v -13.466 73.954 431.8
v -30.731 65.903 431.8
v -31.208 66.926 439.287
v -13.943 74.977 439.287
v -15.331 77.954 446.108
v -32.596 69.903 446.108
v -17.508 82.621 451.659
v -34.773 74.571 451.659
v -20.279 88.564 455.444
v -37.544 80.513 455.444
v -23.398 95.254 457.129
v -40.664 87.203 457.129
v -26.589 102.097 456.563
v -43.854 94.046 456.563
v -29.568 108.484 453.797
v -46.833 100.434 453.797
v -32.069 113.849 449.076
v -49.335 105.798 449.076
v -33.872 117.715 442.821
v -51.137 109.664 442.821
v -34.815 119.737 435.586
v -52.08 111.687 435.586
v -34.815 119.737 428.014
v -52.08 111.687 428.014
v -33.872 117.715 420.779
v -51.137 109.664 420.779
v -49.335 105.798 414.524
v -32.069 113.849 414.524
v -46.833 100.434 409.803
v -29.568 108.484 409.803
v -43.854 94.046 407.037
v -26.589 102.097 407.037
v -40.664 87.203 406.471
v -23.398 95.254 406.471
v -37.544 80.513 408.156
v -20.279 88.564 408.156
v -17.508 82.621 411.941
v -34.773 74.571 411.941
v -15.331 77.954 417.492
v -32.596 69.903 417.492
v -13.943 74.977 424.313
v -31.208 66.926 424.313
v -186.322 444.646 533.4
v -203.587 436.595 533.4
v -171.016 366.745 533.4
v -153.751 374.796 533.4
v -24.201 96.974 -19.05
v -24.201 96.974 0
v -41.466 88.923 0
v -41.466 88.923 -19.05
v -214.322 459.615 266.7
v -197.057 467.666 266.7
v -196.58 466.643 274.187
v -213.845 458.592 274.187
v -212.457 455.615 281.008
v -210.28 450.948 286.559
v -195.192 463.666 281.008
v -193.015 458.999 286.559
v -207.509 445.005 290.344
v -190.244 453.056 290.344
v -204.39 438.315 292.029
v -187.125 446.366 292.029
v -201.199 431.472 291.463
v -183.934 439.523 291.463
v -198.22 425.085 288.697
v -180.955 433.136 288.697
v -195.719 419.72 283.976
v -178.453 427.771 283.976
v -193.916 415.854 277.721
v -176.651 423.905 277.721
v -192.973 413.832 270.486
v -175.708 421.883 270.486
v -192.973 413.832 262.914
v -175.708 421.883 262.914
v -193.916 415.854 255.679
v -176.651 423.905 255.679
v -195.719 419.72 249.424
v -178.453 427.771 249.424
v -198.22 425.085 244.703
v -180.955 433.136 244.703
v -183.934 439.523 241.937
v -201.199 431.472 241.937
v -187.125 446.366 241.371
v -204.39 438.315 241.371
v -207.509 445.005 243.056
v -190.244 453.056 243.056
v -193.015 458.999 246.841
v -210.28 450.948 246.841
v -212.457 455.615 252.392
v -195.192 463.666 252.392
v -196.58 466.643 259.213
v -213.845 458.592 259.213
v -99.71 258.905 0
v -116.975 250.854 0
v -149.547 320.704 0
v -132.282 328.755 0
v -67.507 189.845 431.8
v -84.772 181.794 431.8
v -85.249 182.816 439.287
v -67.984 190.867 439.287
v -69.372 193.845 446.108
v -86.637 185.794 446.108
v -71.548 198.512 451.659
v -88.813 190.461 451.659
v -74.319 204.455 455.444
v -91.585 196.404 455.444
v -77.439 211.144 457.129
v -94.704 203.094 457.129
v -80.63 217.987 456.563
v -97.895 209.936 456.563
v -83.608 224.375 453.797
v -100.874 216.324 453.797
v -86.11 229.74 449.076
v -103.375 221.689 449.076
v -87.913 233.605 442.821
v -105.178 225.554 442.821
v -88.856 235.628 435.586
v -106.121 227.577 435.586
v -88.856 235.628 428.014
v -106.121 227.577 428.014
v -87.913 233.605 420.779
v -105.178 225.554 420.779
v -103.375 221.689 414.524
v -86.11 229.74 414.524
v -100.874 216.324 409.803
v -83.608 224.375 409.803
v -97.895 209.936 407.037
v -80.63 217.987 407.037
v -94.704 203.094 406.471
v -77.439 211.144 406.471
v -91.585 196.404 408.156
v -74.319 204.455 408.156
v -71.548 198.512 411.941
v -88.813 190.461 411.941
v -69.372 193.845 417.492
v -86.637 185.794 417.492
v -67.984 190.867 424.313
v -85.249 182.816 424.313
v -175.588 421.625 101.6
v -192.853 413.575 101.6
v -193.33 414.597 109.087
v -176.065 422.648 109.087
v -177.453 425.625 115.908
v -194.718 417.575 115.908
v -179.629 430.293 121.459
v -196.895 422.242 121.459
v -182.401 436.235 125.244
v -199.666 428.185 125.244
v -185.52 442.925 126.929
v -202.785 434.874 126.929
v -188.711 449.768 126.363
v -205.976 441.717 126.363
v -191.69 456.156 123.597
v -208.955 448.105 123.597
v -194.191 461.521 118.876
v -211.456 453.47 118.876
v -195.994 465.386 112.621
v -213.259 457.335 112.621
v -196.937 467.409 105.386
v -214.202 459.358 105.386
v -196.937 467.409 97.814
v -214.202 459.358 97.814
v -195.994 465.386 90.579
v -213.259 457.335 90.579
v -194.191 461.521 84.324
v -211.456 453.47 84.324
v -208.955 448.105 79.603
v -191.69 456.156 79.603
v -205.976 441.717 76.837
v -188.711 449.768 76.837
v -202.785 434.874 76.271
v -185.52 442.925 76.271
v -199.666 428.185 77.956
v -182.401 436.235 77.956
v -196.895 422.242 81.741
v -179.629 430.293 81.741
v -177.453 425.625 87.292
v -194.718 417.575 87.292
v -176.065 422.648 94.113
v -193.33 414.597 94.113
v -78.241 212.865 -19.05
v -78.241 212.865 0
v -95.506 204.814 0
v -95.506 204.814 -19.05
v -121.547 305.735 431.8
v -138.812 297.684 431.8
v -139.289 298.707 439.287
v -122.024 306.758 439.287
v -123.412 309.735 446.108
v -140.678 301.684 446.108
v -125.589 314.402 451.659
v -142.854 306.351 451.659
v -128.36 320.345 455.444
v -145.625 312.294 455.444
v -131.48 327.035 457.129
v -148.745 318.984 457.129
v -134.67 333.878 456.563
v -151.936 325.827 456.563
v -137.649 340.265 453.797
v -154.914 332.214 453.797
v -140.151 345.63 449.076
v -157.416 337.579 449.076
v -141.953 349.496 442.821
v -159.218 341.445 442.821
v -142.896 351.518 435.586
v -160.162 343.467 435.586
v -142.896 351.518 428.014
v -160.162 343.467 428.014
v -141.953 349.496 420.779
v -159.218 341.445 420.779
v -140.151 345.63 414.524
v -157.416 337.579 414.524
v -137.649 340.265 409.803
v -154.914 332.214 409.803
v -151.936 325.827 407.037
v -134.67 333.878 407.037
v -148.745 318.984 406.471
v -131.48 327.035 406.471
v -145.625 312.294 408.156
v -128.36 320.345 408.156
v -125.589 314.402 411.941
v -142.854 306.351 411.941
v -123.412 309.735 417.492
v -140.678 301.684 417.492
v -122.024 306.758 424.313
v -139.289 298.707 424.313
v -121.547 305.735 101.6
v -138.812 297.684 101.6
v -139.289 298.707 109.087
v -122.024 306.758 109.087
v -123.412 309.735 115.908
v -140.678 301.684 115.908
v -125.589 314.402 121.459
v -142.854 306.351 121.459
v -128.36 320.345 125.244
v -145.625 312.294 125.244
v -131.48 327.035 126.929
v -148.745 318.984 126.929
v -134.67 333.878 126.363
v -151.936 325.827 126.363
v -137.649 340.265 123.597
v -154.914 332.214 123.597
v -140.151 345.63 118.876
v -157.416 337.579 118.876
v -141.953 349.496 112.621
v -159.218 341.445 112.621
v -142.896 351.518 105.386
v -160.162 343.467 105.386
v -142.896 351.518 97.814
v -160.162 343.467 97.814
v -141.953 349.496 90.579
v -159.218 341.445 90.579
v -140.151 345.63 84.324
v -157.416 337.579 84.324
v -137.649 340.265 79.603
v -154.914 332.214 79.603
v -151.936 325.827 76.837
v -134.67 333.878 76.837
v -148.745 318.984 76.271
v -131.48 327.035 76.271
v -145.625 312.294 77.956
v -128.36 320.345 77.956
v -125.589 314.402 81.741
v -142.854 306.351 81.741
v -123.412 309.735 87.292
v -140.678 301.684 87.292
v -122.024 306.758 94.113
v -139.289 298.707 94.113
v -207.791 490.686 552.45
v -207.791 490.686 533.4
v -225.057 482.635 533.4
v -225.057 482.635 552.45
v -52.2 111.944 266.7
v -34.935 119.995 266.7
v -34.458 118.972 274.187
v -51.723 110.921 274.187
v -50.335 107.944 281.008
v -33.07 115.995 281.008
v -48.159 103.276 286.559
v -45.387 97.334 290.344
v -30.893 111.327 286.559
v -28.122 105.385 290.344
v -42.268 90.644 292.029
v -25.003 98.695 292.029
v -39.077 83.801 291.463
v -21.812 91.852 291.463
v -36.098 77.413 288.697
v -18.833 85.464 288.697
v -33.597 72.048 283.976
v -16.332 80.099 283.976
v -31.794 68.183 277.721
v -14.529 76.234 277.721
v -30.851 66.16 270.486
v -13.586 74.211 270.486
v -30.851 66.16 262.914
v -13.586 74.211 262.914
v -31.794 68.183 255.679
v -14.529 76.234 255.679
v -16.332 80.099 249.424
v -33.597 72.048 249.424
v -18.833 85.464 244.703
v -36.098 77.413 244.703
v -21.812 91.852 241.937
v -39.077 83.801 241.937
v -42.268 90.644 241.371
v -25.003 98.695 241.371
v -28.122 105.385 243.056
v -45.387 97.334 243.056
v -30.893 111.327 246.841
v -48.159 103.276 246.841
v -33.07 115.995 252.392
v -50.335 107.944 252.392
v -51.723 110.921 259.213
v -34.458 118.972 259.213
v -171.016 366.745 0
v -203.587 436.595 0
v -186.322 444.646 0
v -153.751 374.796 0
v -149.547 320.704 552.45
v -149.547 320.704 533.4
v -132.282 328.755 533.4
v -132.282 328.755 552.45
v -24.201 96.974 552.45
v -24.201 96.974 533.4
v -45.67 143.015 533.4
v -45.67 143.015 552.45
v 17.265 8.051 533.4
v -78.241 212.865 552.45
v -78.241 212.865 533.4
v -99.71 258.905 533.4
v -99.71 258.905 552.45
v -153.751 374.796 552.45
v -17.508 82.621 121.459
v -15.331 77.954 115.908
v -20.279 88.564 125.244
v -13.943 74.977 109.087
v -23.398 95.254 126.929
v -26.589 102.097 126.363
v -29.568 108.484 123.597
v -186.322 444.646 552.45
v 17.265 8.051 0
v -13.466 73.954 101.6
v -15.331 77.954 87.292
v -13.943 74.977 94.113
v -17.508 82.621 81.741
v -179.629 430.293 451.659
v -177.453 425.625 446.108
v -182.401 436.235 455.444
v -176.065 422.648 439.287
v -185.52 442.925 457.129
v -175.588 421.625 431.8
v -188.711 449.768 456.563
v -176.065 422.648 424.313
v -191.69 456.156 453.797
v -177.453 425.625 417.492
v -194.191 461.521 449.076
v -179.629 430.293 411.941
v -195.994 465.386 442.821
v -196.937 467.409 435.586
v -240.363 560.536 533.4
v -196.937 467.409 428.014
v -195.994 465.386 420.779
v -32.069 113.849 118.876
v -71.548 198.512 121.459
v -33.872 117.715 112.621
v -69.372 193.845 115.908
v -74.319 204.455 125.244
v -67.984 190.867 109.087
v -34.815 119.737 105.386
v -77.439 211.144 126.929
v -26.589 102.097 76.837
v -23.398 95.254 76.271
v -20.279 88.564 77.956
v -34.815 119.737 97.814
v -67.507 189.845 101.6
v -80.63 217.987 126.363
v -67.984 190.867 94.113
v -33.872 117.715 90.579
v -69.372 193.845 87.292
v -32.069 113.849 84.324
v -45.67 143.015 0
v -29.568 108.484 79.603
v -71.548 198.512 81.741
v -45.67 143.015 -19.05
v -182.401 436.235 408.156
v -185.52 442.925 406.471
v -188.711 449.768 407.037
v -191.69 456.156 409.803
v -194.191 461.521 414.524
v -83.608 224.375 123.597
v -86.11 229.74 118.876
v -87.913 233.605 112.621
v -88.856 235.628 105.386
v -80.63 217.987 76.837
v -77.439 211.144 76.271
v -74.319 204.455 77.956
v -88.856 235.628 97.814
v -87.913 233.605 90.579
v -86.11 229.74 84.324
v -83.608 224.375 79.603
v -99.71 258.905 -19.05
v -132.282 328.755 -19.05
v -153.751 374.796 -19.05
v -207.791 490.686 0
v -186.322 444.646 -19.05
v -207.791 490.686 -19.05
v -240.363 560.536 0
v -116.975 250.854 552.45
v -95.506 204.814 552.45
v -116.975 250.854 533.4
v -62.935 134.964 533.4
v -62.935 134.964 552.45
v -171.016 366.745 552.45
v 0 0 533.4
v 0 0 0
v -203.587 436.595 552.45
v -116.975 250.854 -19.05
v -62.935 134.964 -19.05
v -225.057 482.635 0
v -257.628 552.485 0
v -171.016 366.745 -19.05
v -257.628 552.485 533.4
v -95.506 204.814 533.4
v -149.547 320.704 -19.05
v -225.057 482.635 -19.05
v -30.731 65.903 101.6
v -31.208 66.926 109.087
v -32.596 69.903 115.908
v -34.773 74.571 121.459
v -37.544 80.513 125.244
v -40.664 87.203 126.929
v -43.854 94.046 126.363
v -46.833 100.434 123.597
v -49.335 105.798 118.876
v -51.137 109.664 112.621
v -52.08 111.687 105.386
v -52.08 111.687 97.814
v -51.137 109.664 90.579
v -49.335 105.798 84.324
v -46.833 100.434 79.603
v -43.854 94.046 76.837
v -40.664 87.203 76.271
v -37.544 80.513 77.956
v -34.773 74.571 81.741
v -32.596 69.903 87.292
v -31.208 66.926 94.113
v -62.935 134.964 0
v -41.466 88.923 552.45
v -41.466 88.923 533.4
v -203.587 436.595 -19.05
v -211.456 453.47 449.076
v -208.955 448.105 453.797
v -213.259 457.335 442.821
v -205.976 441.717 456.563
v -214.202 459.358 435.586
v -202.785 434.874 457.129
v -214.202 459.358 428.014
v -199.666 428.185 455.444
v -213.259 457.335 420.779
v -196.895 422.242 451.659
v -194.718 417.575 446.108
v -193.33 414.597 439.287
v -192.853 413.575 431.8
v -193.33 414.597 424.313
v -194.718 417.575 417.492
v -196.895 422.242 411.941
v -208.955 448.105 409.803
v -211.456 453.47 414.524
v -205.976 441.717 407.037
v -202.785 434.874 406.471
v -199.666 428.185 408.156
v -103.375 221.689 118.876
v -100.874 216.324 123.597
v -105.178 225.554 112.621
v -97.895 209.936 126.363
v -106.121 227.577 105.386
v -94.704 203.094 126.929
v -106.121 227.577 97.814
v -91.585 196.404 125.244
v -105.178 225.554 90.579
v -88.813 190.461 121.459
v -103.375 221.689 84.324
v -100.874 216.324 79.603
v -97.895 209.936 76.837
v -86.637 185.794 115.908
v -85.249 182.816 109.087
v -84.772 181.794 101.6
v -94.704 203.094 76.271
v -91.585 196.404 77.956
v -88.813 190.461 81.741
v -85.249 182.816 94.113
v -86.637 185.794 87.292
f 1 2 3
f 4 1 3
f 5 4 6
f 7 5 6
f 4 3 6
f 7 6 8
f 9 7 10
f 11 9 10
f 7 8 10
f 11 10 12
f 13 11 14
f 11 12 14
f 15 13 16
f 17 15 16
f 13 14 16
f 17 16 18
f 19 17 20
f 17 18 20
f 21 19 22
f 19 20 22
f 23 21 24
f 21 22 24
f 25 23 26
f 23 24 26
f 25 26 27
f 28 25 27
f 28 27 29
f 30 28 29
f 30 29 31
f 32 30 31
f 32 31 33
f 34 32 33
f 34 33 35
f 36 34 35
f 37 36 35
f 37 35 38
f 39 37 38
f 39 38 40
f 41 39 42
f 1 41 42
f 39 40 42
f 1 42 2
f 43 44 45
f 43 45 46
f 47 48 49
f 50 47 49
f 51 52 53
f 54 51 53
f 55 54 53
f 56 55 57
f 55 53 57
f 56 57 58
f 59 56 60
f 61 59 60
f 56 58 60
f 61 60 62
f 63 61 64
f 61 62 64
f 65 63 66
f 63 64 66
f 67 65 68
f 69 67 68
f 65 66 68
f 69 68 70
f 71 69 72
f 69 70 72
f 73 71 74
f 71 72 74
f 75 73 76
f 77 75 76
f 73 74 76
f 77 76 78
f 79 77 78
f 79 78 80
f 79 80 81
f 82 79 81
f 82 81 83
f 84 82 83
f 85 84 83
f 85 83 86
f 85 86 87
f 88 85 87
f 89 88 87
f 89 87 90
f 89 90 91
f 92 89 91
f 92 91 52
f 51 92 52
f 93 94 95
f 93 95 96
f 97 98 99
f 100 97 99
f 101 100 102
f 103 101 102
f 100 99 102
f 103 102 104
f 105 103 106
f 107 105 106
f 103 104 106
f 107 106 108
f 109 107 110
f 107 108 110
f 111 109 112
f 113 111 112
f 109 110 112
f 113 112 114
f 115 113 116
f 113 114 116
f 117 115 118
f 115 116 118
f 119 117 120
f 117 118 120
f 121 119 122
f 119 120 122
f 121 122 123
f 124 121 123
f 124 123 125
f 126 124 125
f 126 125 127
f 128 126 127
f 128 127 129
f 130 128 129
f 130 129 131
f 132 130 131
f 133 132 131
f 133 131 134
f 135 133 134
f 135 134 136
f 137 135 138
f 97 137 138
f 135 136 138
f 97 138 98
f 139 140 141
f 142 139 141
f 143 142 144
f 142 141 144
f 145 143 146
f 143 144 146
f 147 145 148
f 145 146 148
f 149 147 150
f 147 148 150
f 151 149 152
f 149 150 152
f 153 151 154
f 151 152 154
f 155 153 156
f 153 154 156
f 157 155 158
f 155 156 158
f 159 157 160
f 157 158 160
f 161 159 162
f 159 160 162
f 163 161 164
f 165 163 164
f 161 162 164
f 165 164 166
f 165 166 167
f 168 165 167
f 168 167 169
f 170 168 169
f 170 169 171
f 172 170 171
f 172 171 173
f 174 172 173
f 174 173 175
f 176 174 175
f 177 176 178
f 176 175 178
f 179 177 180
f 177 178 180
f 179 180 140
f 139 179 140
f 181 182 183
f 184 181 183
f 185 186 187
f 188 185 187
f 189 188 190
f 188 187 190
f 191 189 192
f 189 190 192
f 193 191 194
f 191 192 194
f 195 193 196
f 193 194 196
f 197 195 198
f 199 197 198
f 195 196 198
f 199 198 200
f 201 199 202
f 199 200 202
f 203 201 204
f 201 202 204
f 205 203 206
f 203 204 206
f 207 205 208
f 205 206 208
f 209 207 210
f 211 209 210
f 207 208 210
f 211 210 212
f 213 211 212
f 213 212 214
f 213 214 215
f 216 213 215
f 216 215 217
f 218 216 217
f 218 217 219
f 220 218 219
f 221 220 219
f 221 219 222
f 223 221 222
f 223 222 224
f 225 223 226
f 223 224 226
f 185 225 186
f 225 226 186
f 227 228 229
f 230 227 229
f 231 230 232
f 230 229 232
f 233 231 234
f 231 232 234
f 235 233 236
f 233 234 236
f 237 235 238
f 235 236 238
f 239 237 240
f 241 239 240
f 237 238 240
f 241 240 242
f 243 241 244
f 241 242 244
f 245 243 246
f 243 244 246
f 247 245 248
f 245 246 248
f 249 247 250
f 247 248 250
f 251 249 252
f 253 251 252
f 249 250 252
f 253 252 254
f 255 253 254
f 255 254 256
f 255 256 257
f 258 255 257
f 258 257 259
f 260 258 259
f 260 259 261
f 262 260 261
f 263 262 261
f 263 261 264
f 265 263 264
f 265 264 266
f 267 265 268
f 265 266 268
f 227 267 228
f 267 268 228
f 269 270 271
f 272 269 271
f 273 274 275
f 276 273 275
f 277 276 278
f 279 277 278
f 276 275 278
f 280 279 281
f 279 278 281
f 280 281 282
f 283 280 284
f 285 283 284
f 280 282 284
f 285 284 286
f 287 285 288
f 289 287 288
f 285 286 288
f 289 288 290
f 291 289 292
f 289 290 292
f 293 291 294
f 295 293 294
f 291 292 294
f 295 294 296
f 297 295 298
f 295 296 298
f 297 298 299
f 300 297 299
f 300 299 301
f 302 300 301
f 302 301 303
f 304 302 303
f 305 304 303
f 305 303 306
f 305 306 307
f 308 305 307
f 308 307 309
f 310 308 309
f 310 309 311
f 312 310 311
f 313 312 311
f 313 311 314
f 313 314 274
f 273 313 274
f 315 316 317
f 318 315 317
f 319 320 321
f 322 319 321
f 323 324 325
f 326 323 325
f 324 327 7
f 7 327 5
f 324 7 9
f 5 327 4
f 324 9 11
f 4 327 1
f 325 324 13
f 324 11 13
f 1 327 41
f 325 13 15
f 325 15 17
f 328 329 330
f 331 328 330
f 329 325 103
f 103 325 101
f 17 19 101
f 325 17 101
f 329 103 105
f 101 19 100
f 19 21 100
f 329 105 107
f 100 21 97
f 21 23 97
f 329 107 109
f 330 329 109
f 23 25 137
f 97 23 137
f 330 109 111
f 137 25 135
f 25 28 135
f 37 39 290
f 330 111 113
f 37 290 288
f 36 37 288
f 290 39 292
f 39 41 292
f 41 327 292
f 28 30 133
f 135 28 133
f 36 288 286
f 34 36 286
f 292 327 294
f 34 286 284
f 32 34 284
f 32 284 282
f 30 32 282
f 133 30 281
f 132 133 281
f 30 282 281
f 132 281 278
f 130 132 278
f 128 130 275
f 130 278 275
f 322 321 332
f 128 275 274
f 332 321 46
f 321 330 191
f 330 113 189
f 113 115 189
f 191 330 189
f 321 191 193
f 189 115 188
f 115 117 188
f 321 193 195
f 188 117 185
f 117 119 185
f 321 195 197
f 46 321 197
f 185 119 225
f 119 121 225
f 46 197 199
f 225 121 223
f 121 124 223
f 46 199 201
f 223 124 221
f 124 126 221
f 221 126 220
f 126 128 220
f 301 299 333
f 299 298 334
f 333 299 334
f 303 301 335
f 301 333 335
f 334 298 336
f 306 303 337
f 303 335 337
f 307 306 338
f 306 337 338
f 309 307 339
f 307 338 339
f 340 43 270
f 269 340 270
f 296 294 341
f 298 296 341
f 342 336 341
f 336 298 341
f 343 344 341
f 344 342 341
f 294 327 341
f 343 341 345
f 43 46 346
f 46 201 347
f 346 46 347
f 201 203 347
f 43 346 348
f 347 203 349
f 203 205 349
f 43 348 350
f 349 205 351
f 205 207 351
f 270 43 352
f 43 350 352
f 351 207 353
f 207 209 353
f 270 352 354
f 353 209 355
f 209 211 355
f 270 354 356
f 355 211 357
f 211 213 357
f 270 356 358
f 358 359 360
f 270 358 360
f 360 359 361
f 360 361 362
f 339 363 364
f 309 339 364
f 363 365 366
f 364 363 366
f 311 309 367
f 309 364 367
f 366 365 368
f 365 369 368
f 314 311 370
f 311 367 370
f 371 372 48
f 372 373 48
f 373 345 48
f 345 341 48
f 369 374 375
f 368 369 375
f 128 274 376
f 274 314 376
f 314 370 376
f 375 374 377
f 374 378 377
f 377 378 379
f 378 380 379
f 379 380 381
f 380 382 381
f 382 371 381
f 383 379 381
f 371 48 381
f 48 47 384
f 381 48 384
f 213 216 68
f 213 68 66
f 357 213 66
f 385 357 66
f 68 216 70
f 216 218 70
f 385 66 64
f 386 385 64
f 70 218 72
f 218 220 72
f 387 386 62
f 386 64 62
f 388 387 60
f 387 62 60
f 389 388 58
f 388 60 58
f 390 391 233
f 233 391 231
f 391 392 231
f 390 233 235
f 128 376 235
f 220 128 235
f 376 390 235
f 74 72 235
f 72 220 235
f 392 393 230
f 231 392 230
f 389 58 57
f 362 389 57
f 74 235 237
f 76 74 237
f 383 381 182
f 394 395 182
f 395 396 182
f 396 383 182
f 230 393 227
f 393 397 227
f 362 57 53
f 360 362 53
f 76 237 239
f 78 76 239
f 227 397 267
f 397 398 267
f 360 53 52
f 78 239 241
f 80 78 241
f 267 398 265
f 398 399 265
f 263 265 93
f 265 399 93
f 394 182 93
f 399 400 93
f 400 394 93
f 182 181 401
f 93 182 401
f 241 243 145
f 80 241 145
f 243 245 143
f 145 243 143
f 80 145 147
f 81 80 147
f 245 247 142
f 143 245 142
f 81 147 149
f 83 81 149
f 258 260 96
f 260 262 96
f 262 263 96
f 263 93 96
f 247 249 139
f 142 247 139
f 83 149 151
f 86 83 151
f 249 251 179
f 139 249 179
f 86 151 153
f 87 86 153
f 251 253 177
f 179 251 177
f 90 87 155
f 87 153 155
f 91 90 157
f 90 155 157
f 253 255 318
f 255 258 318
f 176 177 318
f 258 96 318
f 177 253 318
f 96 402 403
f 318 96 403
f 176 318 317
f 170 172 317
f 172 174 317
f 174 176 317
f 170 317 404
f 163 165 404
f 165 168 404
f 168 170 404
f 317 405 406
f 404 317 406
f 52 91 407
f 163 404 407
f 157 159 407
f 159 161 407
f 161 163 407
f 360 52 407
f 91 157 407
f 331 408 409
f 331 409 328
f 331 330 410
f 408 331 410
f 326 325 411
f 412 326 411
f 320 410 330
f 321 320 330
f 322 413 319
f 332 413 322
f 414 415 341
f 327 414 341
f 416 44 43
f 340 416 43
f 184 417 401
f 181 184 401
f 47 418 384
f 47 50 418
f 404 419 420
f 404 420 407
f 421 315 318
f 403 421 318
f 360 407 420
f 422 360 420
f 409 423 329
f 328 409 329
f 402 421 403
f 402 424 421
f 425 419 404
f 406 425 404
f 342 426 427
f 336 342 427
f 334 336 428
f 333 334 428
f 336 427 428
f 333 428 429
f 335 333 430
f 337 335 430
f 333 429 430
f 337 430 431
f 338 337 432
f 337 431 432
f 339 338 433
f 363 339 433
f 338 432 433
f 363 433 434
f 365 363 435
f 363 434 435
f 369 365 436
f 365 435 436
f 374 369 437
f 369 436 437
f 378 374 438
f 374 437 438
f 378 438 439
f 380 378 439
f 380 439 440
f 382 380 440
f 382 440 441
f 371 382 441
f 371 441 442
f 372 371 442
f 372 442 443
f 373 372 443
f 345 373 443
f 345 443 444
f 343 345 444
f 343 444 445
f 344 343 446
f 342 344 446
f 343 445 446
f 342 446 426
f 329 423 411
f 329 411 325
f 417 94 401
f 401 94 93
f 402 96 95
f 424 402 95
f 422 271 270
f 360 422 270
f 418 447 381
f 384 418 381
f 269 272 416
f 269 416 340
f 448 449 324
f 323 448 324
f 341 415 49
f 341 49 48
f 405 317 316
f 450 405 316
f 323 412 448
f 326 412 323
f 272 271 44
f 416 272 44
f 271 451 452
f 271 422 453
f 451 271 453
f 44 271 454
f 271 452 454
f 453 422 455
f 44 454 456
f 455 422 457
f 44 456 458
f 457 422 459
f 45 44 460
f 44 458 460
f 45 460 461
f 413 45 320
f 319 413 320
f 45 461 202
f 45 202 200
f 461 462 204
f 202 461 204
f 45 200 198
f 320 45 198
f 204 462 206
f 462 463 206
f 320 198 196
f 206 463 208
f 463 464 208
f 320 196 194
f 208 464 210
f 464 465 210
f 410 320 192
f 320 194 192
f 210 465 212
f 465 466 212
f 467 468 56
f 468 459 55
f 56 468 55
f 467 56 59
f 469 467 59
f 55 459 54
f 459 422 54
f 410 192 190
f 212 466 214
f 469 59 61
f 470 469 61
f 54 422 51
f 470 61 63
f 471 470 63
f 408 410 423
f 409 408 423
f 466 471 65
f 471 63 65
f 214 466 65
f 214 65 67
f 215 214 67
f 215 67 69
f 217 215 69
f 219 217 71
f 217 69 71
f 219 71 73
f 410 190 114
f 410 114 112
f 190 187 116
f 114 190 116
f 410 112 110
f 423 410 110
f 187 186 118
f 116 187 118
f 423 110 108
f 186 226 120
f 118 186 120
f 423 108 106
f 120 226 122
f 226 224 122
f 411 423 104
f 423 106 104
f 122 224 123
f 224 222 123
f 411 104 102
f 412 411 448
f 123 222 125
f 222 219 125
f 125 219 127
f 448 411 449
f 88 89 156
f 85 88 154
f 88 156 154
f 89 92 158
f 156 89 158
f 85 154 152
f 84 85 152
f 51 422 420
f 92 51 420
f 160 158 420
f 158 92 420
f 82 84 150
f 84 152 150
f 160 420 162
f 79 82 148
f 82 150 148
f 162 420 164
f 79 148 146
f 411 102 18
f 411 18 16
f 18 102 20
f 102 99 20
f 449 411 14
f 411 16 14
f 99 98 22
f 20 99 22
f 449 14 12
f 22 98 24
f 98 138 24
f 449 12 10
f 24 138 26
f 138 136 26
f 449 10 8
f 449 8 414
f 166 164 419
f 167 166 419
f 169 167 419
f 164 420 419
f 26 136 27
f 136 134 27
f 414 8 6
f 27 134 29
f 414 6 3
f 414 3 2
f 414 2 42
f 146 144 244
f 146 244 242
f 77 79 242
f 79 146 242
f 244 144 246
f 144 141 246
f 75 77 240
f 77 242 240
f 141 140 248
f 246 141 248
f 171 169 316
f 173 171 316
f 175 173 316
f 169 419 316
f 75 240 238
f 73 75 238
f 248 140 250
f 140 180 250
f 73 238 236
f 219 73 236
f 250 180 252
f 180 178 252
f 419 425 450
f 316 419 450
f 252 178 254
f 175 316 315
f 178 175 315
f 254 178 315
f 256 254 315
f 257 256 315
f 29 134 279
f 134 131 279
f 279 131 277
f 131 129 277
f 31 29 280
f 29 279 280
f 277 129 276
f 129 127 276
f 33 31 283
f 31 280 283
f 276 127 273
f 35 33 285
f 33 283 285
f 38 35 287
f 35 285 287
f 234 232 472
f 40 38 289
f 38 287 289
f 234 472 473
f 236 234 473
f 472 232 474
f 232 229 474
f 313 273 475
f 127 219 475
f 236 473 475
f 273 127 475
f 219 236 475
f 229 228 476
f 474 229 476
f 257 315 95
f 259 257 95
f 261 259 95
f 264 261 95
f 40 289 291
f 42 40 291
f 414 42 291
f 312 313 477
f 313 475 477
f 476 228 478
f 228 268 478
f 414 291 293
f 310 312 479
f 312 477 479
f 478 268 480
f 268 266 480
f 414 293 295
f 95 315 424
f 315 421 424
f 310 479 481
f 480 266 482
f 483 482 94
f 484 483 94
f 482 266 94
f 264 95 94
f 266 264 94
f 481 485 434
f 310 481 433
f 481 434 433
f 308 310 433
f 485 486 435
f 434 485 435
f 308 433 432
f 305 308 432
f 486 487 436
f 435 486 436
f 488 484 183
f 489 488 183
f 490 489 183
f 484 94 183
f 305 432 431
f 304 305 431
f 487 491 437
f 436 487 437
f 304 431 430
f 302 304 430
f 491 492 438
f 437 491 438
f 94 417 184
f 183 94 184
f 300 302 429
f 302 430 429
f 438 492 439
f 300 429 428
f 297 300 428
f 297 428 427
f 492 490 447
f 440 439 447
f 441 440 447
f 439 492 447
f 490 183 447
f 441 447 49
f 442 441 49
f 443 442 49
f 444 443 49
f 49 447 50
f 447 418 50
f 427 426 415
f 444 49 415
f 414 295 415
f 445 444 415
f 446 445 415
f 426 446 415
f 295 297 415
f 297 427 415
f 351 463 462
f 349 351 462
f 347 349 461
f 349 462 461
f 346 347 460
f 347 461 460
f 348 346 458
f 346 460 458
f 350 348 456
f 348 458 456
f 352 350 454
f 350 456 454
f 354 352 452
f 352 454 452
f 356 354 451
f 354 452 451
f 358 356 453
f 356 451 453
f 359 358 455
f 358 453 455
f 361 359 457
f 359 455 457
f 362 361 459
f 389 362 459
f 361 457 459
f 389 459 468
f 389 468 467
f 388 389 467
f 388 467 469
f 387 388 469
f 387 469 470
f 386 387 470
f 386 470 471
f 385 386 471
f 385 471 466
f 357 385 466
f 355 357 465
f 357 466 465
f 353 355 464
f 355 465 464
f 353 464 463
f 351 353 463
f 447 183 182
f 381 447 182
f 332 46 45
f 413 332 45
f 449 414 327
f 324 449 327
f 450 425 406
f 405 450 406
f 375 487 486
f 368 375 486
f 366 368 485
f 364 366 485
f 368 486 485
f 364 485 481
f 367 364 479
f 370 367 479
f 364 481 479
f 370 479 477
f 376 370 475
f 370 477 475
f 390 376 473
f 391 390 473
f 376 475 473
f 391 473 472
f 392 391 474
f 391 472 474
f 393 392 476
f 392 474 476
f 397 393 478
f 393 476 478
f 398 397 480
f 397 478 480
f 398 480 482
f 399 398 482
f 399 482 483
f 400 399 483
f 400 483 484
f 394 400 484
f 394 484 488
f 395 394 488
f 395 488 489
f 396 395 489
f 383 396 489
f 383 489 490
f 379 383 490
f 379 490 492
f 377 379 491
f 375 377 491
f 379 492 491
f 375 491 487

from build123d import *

# Parameters (mm, degrees)
F1_DEPTH  = 533.4
F3_DEPTH  = 19.05
F5_DEPTH  = 19.05
F7_R      = 25.4
F8_DEPTH  = 19.05
F9_R      = 25.4
F10_DEPTH = 25.4


with BuildPart() as f1:
    # F0 (on Top) → F1 (new body)
    with BuildSketch(Plane.XY):
        Polygon((-257.6280923571, 552.4852269775), (0, 0), (17.265163343, 8.0508778862), (-240.3629290141, 560.5361048637), align=None)
    extrude(amount=F1_DEPTH)

    # F2 (on face) → F3 (join)
    with BuildSketch(Plane(origin=(0, 0, 0), x_dir=(1, 0, 0), z_dir=(0, 0, -1))):
        Polygon((-225.056502435, -482.6352269775), (-207.791339092, -490.6861048637), (-186.3223313955, -444.6456692822), (-203.5874947386, -436.5947913961), align=None)
        Polygon((-171.0159048164, -366.7447913961), (-153.7507414734, -374.7956692822), (-132.281733777, -328.7552337008), (-149.54689712, -320.7043558146), align=None)
        Polygon((-116.9753071979, -250.8543558146), (-99.7101438548, -258.9052337008), (-78.2411361584, -212.8647981193), (-95.5062995015, -204.8139202332), align=None)
        Polygon((-62.9347095793, -134.9639202332), (-45.6695462363, -143.0147981193), (-24.2005385399, -96.9743625379), (-41.4657018829, -88.9234846517), align=None)
    extrude(amount=F3_DEPTH)

    # F4 (on face) → F5 (join)
    with BuildSketch(Plane.XY.offset(533.4)):
        Polygon((-207.791339092, 490.6861048637), (-225.056502435, 482.6352269775), (-203.5874947386, 436.5947913961), (-186.3223313955, 444.6456692822), align=None)
        Polygon((-171.0159048164, 366.7447913961), (-149.54689712, 320.7043558146), (-132.281733777, 328.7552337008), (-153.7507414734, 374.7956692822), align=None)
        Polygon((-78.2411361584, 212.8647981193), (-99.7101438548, 258.9052337008), (-116.9753071979, 250.8543558146), (-95.5062995015, 204.8139202332), align=None)
        Polygon((-24.2005385399, 96.9743625379), (-45.6695462363, 143.0147981193), (-62.9347095793, 134.9639202332), (-41.4657018829, 88.9234846517), align=None)
    extrude(amount=F5_DEPTH)

    # F7 (on face) → F8 (cut)
    with BuildSketch(Plane(origin=(0, 0, 0), x_dir=(0.4226182617, -0.906307787, 0), z_dir=(-0.906307787, -0.4226182617, 0))):
        with Locations((-98.1162094419, 431.8)):
            Circle(F7_R)
        with Locations((-98.1162094419, 101.6)):
            Circle(F7_R)
        with Locations((-353.8581047209, 101.6)):
            Circle(F7_R)
        with Locations((-481.7290523605, 101.6)):
            Circle(F7_R)
        with Locations((-225.9871570814, 101.6)):
            Circle(F7_R)
        with Locations((-225.9871570814, 431.8)):
            Circle(F7_R)
        with Locations((-353.8581047209, 431.8)):
            Circle(F7_R)
        with Locations((-481.7290523605, 431.8)):
            Circle(F7_R)
    extrude(amount=-F8_DEPTH, mode=Mode.SUBTRACT)

    # F9 (on face) → F10 (cut)
    with BuildSketch(Plane(origin=(17.265163343, 8.0508778862, 0), x_dir=(-0.4226182617, 0.906307787, 0), z_dir=(0.906307787, 0.4226182617, 0))):
        with Locations((481.7290523605, 266.7)):
            Circle(F9_R)
        with Locations((98.1162094419, 266.7)):
            Circle(F9_R)
    extrude(amount=-F10_DEPTH, mode=Mode.SUBTRACT)


solid = f1.part
